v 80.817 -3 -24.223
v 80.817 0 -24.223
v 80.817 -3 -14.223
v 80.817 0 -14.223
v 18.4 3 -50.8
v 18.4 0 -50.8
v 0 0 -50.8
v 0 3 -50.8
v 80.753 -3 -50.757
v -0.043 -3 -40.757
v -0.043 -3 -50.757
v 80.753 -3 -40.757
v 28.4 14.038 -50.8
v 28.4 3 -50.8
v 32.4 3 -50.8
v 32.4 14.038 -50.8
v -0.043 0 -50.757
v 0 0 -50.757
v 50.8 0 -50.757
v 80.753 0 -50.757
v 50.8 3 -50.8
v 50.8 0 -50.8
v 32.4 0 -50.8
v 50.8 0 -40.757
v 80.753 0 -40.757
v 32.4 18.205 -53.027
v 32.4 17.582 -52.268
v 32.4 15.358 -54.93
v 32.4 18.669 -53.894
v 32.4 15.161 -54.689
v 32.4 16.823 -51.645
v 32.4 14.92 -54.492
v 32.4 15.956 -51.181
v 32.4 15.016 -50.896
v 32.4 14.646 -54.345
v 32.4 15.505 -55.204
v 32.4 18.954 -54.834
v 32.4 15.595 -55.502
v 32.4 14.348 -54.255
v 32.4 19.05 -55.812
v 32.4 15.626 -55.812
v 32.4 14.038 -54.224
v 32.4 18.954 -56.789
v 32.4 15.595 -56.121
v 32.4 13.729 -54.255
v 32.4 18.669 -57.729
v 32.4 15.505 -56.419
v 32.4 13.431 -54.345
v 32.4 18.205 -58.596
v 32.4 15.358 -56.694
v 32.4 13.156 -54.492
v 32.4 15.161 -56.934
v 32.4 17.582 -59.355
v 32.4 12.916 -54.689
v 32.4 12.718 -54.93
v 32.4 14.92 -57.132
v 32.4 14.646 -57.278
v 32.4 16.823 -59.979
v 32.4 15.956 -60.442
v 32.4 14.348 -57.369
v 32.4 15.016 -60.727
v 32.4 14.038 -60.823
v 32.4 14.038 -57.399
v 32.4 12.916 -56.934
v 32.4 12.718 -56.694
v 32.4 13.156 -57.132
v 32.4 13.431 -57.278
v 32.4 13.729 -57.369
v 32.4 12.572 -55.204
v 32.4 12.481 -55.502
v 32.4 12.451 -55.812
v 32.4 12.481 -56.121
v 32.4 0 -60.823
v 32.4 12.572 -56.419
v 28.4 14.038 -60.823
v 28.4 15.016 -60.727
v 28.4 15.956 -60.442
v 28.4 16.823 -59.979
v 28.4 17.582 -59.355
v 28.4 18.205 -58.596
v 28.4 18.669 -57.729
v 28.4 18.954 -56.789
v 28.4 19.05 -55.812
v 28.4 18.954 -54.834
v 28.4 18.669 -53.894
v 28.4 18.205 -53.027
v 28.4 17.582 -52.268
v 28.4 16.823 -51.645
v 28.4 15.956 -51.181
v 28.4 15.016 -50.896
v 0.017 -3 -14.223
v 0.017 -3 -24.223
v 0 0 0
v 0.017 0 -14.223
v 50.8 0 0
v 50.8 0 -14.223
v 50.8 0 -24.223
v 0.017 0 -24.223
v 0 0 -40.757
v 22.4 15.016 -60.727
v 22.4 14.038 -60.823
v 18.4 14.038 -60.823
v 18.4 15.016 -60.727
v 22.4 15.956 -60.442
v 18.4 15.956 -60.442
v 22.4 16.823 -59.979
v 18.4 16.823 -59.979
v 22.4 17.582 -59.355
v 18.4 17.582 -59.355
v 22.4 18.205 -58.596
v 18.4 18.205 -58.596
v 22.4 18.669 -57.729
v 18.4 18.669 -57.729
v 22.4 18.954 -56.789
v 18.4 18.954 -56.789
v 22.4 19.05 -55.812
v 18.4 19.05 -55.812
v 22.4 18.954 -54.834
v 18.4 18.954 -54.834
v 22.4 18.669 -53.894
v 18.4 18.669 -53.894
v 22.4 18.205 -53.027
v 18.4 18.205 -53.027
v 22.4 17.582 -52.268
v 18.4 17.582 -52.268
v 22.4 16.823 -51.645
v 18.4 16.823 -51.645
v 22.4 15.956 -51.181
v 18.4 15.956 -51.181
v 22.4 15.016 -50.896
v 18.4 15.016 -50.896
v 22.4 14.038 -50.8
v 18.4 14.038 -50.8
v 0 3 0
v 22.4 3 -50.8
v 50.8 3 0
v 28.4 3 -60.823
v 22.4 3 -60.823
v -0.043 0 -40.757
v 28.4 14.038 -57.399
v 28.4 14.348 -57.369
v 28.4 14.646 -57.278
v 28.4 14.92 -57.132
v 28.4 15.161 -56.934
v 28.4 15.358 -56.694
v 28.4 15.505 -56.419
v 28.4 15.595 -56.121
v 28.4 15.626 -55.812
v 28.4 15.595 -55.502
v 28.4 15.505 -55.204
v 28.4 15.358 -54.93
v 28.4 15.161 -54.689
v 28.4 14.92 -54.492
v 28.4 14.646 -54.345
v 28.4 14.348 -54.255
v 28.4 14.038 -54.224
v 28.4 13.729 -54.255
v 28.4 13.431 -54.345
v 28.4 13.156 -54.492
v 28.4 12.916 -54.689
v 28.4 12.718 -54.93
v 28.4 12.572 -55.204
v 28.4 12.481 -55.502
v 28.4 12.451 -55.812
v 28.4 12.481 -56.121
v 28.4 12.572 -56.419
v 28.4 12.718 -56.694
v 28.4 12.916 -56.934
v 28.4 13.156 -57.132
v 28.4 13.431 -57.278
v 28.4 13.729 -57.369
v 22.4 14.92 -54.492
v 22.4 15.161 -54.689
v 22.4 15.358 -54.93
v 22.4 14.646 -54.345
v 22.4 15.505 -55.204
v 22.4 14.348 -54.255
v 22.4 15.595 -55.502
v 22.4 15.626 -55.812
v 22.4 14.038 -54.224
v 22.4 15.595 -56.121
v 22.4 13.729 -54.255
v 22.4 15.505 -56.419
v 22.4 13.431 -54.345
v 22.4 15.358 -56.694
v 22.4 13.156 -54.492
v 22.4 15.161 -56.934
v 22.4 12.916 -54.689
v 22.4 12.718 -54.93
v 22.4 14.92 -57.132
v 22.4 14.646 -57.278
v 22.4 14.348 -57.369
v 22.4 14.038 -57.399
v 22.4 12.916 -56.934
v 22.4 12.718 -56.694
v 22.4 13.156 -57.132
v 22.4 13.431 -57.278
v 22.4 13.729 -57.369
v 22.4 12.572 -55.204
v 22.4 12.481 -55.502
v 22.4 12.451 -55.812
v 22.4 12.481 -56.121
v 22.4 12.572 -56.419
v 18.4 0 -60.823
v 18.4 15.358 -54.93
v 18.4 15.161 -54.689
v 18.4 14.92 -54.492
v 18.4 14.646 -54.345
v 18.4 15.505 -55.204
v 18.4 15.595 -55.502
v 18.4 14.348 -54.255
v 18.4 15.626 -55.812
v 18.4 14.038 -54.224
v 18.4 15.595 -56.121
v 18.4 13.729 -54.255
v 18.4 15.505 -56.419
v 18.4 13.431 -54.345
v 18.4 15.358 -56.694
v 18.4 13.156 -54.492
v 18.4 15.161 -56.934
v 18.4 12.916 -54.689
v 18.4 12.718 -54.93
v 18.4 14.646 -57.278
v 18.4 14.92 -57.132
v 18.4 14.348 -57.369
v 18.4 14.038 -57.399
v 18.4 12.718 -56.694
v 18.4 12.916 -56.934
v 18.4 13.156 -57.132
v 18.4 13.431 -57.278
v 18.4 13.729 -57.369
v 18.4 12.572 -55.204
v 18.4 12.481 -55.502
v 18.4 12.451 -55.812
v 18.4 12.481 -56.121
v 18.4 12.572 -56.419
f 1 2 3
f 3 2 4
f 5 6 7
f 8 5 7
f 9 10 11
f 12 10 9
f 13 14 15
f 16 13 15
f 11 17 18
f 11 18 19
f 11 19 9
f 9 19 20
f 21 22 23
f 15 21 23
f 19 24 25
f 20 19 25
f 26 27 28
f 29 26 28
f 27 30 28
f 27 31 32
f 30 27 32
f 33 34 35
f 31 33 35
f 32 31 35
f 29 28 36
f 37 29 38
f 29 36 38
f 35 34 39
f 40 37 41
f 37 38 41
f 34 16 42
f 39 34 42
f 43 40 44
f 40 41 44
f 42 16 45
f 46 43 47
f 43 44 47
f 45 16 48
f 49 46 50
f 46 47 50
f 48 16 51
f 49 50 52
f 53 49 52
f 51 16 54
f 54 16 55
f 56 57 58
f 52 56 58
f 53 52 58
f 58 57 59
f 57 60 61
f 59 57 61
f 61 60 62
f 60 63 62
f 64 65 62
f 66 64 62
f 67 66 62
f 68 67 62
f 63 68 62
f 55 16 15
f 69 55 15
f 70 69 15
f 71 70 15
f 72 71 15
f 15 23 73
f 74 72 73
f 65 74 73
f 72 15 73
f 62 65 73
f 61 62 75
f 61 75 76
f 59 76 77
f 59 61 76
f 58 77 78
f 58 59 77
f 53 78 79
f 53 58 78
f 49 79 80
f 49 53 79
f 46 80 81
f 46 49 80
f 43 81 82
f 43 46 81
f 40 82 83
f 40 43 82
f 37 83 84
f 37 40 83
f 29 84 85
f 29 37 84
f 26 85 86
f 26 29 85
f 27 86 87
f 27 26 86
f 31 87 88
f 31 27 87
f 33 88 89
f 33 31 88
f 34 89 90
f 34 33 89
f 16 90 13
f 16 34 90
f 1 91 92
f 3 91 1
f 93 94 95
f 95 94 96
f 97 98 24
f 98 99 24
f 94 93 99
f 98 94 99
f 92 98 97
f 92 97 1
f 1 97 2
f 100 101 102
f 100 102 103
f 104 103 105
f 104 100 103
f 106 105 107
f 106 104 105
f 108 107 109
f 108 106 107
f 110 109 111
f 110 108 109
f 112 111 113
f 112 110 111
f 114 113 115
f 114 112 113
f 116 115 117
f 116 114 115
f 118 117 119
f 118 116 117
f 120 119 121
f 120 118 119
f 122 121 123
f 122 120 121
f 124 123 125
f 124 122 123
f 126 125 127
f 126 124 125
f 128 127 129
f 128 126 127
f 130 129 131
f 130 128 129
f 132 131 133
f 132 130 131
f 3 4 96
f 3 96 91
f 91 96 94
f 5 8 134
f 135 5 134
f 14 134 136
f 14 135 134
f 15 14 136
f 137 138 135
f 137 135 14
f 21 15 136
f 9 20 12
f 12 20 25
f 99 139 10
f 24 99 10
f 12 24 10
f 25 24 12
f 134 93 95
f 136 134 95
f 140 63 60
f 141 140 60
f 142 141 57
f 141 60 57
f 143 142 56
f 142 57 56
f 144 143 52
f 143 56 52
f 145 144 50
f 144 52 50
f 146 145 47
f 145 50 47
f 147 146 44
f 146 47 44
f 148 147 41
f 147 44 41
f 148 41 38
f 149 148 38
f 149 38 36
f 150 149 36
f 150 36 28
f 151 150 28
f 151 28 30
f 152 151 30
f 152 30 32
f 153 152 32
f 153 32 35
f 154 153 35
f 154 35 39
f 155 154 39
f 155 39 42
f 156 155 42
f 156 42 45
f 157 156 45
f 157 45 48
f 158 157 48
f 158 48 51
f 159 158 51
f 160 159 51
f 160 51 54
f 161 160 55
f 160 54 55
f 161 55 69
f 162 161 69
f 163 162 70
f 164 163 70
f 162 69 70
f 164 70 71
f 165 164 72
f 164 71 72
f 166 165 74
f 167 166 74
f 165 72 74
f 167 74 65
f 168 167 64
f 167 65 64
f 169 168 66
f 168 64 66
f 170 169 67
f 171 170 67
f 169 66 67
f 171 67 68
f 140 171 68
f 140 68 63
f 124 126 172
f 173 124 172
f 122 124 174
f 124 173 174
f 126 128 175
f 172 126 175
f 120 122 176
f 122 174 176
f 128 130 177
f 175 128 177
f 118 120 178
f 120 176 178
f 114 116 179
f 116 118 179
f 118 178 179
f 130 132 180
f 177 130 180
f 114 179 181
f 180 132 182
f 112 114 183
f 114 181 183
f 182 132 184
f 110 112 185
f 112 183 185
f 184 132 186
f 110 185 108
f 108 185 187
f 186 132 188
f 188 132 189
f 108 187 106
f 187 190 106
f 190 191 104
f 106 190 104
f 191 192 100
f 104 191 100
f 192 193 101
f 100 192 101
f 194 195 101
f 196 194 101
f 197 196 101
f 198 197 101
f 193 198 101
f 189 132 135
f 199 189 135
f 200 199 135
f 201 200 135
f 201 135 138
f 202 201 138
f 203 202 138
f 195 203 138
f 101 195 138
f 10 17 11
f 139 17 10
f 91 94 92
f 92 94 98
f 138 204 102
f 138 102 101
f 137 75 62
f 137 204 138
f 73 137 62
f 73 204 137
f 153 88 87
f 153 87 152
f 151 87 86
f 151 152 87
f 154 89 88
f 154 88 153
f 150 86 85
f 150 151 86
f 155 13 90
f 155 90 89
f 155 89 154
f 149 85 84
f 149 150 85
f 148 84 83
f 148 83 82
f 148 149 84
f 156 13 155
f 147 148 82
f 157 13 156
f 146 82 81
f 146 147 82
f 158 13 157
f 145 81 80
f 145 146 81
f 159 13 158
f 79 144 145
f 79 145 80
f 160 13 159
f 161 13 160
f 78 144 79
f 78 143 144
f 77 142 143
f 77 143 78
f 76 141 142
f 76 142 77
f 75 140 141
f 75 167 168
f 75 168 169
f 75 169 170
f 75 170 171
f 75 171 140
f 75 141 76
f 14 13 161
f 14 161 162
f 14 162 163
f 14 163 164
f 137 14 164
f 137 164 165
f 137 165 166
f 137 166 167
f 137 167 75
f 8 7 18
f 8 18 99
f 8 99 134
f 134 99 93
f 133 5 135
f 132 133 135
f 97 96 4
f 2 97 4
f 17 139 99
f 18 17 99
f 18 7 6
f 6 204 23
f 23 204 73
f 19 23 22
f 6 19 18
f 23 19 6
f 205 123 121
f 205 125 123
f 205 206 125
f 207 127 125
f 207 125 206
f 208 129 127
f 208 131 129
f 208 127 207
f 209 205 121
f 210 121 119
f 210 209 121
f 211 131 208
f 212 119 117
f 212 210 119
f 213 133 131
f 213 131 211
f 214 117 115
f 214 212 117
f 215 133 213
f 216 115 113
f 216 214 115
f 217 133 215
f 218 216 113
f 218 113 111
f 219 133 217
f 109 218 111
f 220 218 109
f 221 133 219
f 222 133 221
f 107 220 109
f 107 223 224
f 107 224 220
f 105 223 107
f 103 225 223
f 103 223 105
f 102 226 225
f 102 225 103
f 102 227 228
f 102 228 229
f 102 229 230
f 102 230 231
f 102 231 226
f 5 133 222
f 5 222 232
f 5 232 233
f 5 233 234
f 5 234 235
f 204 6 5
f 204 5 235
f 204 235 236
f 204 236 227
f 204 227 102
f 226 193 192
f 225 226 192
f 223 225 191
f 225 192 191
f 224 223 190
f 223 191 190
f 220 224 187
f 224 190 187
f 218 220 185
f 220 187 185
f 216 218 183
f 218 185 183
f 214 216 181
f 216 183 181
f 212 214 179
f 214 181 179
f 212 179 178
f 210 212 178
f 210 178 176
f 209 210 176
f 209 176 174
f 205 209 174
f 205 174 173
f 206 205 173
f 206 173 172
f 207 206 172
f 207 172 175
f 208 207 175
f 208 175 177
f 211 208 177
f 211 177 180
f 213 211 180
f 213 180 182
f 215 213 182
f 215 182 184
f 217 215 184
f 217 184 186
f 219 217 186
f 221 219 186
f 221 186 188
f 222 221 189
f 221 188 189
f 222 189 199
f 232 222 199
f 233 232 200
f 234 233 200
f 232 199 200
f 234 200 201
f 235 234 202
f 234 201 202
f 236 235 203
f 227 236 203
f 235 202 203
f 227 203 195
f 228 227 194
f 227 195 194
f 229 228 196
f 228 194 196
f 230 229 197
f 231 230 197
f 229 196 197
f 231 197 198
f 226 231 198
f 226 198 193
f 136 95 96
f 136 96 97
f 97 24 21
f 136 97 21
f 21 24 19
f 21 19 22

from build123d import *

# Parameters (mm, degrees)
BOSS_EXTRUDE1_DEPTH = 3
SKETCH1_3_W         = 4
SKETCH1_3_H         = 10.023203152
BOSS_EXTRUDE2_DEPTH = 19.05
SKETCH2_R           = 1.5875
CUT_EXTRUDE1_DEPTH  = 19.05
SKETCH3_W           = 80.796379589
SKETCH3_H           = 10
BOSS_EXTRUDE3_DEPTH = 3


with BuildPart() as part:
    # Sketch1 → Boss-Extrude1 (new body)
    with BuildSketch(Plane(origin=(0, 0, 0), x_dir=(1, 0, 0), z_dir=(0, 1, 0))):
        Polygon((0, 50.8), (0, 0), (50.8, 0), (50.8, 50.8), (28.4, 50.8), (28.4, 60.823203152), (22.4, 60.823203152), (22.4, 50.8), align=None)
    extrude(amount=BOSS_EXTRUDE1_DEPTH)

    # Sketch1<3> → Boss-Extrude2 (add)
    with BuildSketch(Plane(origin=(0, 0, 0), x_dir=(1, 0, 0), z_dir=(0, 1, 0))):
        with Locations((20.4, 55.811601576)):
            Rectangle(SKETCH1_3_W, SKETCH1_3_H)
        with Locations((30.4, 55.811601576)):
            Rectangle(SKETCH1_3_W, SKETCH1_3_H)
    extrude(amount=BOSS_EXTRUDE2_DEPTH)

    # Sketch2 → Cut-Extrude1 (cut)
    with BuildSketch(Plane(origin=(32.4, 0, 0), x_dir=(0, 0, -1), z_dir=(1, 0, 0))):
        with Locations((55.811601576, 14.038398424)):
            Circle(SKETCH2_R)
        with BuildLine():
            Line((50.8, 14.038398424), (49.911458456, 20.395059664))
            Line((49.911458456, 20.395059664), (64.501767063, 21.247740037))
            Line((64.501767063, 21.247740037), (60.823203152, 14.038398424))
            ThreePointArc((60.823203152, 14.038398424), (55.811601576, 19.05), (50.8, 14.038398424))
        make_face()
    extrude(amount=-CUT_EXTRUDE1_DEPTH, mode=Mode.SUBTRACT)

    # Sketch3 → Boss-Extrude3 (add)
    with BuildSketch(Plane.XZ):
        Polygon((30.017240132, -14.222777316), (0.017240132, -14.222777316), (0.017240132, -24.222777316), (80.817240132, -24.222777316), (80.817240132, -14.222777316), align=None)
        with Locations((40.354723884, -45.757439596)):
            Rectangle(SKETCH3_W, SKETCH3_H)
    extrude(amount=BOSS_EXTRUDE3_DEPTH)


solid = part.part
